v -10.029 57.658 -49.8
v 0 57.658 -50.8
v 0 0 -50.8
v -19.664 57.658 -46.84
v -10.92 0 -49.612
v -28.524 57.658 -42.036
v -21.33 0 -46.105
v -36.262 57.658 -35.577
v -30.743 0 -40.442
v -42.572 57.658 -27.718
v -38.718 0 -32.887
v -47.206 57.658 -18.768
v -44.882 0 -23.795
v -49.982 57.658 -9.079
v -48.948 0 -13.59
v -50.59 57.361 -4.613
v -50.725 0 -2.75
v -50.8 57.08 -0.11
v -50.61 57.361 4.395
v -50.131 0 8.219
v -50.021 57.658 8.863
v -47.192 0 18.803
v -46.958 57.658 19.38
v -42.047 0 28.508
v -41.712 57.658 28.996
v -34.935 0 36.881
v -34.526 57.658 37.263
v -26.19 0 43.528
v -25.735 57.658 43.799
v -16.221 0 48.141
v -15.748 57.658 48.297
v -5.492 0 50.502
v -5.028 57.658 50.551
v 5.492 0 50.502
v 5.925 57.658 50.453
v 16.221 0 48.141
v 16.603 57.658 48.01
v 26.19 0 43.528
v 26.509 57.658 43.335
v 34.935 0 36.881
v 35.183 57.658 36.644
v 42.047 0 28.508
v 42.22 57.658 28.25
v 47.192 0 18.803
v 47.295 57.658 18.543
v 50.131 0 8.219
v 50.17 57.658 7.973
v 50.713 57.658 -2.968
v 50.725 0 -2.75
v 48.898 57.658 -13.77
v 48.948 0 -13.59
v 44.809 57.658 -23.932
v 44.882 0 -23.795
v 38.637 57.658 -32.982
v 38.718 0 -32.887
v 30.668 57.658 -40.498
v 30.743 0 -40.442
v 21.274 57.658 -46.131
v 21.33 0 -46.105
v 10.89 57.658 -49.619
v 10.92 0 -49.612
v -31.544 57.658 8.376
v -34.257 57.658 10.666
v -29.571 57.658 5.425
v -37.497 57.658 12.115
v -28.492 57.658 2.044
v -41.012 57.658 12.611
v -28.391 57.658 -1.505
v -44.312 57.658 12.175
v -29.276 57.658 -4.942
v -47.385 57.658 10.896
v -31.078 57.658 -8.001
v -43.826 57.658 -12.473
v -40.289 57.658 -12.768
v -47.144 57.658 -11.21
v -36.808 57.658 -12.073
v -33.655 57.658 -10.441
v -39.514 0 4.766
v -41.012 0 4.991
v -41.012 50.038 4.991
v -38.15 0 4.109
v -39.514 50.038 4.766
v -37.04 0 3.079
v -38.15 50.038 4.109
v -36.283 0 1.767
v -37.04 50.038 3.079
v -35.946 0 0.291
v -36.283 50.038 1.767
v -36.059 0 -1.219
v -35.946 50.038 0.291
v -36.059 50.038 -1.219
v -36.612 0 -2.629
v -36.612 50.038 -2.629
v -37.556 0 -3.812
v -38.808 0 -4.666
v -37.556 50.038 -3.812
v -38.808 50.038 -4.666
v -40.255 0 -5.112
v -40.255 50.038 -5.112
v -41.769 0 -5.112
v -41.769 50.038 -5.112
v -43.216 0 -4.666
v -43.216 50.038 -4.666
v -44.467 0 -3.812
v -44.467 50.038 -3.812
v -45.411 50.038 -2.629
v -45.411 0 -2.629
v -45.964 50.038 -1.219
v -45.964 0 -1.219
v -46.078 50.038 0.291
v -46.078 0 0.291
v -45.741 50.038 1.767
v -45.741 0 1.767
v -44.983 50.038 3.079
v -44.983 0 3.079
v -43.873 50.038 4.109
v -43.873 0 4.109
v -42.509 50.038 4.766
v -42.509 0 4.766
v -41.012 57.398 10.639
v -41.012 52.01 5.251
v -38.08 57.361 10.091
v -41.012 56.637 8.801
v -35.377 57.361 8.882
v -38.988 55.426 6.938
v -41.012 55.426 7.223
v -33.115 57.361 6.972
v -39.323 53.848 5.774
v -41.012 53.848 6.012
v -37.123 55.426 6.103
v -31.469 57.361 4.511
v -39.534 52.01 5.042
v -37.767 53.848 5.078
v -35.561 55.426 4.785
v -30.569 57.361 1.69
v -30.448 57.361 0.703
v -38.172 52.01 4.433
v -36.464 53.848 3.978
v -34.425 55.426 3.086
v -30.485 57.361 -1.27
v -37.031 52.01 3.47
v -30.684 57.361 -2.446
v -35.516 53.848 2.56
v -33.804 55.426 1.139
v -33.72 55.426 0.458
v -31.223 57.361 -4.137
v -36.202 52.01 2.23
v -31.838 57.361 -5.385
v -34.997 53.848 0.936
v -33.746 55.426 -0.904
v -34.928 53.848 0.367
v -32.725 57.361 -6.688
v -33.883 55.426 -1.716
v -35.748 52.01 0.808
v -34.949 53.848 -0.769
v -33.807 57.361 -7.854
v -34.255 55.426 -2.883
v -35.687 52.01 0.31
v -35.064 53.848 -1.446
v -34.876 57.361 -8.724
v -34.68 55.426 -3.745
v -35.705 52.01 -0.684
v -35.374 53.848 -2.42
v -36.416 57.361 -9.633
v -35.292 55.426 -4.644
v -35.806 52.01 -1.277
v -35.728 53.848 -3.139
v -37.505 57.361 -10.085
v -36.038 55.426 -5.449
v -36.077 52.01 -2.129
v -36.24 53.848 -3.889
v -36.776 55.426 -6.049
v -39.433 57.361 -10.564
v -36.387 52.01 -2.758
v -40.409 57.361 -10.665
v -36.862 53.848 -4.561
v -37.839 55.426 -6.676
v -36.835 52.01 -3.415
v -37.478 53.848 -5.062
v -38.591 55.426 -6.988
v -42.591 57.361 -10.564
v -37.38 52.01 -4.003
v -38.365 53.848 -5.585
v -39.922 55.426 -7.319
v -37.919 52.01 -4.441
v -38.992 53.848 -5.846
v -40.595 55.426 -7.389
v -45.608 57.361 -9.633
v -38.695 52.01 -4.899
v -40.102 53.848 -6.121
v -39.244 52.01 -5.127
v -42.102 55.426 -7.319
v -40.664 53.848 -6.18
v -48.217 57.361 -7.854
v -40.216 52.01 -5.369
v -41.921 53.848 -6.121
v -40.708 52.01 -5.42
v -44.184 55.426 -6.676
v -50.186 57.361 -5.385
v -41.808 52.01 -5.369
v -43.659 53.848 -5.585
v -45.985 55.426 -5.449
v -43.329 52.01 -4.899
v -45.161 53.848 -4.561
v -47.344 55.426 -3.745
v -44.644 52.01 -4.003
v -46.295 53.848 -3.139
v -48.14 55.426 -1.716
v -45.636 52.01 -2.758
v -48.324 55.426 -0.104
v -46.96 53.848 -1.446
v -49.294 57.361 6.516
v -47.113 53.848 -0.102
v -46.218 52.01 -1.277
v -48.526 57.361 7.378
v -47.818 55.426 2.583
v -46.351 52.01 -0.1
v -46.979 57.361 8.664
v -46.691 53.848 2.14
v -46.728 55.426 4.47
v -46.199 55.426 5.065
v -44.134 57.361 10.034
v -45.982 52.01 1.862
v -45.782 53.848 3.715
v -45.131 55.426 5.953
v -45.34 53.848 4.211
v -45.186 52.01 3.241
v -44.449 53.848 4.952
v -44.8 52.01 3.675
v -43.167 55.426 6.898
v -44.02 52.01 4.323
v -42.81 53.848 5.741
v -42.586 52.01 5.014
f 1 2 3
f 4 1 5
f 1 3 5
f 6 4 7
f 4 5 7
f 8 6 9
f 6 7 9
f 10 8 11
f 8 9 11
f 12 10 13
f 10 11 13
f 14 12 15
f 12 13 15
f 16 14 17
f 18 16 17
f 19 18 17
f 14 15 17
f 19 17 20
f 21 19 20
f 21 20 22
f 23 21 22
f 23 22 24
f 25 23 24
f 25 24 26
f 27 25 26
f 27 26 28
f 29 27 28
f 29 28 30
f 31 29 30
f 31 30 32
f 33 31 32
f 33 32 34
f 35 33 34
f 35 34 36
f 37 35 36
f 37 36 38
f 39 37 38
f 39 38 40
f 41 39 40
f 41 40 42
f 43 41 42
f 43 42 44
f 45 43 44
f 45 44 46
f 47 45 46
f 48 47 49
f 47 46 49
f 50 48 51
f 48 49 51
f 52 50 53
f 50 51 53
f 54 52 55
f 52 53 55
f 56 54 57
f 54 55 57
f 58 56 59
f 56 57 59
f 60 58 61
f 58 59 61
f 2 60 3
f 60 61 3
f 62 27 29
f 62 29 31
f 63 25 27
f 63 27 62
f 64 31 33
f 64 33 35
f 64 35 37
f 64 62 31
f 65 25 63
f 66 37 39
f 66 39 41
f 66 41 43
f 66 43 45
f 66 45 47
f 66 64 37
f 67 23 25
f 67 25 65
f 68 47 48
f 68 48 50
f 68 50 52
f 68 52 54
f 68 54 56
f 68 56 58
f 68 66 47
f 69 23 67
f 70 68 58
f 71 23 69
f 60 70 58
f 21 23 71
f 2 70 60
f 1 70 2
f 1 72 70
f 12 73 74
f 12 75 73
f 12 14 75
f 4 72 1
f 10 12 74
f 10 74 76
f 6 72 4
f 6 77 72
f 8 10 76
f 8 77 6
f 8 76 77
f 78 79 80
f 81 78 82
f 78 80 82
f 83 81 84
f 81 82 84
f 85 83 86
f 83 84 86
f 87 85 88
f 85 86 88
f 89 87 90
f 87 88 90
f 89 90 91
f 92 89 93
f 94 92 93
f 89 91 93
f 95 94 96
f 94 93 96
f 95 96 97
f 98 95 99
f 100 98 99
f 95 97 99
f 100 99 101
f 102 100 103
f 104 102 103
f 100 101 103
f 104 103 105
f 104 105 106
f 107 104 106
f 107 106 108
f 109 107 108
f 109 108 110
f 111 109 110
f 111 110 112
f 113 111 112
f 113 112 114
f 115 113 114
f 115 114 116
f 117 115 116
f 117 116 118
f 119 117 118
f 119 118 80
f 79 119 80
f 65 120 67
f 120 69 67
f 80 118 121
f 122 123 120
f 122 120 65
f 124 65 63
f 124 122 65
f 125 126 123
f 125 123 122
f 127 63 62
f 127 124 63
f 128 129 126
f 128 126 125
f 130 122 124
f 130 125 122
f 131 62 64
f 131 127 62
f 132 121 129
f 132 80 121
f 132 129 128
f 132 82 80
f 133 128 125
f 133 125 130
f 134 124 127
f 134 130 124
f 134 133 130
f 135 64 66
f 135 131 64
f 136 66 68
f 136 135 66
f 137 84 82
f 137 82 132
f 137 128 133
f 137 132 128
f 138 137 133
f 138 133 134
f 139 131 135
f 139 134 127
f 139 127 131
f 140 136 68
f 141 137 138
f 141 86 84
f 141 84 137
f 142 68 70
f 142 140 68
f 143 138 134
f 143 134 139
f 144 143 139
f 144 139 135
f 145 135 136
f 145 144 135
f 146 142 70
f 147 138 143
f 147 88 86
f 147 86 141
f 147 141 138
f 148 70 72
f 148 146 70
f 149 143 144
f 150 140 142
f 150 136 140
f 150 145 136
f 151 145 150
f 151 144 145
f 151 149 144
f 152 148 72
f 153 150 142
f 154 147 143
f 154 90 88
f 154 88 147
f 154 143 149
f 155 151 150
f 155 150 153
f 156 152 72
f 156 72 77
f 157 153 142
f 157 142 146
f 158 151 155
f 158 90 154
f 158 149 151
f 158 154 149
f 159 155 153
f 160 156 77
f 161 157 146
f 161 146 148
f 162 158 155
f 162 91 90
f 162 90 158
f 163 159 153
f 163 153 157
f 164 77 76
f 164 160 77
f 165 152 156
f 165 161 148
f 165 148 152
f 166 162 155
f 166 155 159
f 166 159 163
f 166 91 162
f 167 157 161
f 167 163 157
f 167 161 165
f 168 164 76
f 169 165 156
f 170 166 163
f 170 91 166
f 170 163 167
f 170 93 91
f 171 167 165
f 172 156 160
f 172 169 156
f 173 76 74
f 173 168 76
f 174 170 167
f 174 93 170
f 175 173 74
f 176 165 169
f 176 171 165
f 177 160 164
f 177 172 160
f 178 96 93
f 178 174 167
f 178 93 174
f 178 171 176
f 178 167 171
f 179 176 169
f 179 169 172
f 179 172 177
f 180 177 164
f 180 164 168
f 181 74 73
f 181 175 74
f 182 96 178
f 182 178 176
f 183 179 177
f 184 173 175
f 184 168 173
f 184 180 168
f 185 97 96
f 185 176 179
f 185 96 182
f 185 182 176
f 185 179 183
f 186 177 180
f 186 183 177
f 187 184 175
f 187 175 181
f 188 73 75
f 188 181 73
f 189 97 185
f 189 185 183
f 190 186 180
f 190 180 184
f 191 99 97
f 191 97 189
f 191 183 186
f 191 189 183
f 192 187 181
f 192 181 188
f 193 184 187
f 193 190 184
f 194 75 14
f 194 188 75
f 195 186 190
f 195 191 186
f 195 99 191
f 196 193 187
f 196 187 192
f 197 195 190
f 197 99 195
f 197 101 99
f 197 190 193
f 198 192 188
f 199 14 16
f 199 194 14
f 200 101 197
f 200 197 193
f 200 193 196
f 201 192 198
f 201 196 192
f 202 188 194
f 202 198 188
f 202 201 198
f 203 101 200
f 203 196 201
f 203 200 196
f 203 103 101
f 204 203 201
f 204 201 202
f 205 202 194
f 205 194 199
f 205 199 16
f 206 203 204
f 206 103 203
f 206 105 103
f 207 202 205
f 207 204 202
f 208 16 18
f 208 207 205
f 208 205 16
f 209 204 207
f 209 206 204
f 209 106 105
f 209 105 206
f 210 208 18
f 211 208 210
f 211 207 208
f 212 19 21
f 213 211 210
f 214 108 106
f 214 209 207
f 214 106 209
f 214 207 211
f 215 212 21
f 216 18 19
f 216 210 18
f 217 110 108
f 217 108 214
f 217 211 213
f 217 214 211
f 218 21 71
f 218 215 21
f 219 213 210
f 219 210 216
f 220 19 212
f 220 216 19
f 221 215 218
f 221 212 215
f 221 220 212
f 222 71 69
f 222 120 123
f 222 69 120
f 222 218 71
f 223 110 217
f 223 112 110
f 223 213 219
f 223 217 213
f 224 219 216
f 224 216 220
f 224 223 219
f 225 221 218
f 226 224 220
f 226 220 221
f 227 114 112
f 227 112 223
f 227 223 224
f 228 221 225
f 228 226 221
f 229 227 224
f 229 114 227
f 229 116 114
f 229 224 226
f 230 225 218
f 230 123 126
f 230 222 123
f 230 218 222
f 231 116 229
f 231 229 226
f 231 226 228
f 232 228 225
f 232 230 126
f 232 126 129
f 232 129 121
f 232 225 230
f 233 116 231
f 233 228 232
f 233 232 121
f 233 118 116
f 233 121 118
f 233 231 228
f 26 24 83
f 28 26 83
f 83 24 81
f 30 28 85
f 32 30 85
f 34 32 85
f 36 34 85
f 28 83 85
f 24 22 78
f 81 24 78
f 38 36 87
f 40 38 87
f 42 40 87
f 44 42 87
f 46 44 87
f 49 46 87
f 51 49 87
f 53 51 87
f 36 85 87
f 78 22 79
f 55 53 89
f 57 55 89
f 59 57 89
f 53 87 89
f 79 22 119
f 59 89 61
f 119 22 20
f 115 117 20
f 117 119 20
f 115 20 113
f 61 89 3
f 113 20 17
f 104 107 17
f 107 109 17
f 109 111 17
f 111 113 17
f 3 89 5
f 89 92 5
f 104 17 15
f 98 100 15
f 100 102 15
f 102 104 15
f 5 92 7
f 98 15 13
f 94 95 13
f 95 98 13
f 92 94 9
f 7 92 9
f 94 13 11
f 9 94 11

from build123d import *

# Parameters (mm, degrees)
SKETCH2_R           = 50.8
BOSS_EXTRUDE1_DEPTH = 57.658
SKETCH3_R           = 5.08
CUT_EXTRUDE1_DEPTH  = 57.658
FILLET1_R           = 7.62


with BuildPart() as part:
    # Sketch2 → Boss-Extrude1 (new body)
    with BuildSketch(Plane(origin=(0, 0, 0), x_dir=(1, 0, 0), z_dir=(0, 1, 0))):
        with Locations(Location((0, 0, 0), (0, 0, 90))):
            Circle(SKETCH2_R)
    extrude(amount=BOSS_EXTRUDE1_DEPTH)

    # Sketch3 → Cut-Extrude1 (cut)
    with BuildSketch(Plane(origin=(0, 57.658, 0), x_dir=(1, 0, 0), z_dir=(0, 1, 0))):
        with Locations(Location((-41.011760438, 0.088591559, 0), (0, 0, 270))):
            Circle(SKETCH3_R)
    extrude(amount=-CUT_EXTRUDE1_DEPTH, mode=Mode.SUBTRACT)

    # Fillet1
    # the kernel refuses this fillet: 7.62 mm, written as the material it takes off along each edge
    with BuildSketch(Plane(origin=(-41.011760438, 57.658, -0.088591559), x_dir=(0, 0, 1), z_dir=(-1, 0, 0))) as fillet1_piece_1:
        with BuildLine():
            CenterArc((5.08 + FILLET1_R, -FILLET1_R), FILLET1_R, 90, 90)
            Line((5.08, -FILLET1_R), (5.08, 0))
            Line((5.08, 0), (5.08 + FILLET1_R, 0))
        make_face()
    revolve(axis=Axis((-41.011760438, 57.658, -0.088591559), (0, 1, 0)), mode=Mode.SUBTRACT)


solid = part.part
